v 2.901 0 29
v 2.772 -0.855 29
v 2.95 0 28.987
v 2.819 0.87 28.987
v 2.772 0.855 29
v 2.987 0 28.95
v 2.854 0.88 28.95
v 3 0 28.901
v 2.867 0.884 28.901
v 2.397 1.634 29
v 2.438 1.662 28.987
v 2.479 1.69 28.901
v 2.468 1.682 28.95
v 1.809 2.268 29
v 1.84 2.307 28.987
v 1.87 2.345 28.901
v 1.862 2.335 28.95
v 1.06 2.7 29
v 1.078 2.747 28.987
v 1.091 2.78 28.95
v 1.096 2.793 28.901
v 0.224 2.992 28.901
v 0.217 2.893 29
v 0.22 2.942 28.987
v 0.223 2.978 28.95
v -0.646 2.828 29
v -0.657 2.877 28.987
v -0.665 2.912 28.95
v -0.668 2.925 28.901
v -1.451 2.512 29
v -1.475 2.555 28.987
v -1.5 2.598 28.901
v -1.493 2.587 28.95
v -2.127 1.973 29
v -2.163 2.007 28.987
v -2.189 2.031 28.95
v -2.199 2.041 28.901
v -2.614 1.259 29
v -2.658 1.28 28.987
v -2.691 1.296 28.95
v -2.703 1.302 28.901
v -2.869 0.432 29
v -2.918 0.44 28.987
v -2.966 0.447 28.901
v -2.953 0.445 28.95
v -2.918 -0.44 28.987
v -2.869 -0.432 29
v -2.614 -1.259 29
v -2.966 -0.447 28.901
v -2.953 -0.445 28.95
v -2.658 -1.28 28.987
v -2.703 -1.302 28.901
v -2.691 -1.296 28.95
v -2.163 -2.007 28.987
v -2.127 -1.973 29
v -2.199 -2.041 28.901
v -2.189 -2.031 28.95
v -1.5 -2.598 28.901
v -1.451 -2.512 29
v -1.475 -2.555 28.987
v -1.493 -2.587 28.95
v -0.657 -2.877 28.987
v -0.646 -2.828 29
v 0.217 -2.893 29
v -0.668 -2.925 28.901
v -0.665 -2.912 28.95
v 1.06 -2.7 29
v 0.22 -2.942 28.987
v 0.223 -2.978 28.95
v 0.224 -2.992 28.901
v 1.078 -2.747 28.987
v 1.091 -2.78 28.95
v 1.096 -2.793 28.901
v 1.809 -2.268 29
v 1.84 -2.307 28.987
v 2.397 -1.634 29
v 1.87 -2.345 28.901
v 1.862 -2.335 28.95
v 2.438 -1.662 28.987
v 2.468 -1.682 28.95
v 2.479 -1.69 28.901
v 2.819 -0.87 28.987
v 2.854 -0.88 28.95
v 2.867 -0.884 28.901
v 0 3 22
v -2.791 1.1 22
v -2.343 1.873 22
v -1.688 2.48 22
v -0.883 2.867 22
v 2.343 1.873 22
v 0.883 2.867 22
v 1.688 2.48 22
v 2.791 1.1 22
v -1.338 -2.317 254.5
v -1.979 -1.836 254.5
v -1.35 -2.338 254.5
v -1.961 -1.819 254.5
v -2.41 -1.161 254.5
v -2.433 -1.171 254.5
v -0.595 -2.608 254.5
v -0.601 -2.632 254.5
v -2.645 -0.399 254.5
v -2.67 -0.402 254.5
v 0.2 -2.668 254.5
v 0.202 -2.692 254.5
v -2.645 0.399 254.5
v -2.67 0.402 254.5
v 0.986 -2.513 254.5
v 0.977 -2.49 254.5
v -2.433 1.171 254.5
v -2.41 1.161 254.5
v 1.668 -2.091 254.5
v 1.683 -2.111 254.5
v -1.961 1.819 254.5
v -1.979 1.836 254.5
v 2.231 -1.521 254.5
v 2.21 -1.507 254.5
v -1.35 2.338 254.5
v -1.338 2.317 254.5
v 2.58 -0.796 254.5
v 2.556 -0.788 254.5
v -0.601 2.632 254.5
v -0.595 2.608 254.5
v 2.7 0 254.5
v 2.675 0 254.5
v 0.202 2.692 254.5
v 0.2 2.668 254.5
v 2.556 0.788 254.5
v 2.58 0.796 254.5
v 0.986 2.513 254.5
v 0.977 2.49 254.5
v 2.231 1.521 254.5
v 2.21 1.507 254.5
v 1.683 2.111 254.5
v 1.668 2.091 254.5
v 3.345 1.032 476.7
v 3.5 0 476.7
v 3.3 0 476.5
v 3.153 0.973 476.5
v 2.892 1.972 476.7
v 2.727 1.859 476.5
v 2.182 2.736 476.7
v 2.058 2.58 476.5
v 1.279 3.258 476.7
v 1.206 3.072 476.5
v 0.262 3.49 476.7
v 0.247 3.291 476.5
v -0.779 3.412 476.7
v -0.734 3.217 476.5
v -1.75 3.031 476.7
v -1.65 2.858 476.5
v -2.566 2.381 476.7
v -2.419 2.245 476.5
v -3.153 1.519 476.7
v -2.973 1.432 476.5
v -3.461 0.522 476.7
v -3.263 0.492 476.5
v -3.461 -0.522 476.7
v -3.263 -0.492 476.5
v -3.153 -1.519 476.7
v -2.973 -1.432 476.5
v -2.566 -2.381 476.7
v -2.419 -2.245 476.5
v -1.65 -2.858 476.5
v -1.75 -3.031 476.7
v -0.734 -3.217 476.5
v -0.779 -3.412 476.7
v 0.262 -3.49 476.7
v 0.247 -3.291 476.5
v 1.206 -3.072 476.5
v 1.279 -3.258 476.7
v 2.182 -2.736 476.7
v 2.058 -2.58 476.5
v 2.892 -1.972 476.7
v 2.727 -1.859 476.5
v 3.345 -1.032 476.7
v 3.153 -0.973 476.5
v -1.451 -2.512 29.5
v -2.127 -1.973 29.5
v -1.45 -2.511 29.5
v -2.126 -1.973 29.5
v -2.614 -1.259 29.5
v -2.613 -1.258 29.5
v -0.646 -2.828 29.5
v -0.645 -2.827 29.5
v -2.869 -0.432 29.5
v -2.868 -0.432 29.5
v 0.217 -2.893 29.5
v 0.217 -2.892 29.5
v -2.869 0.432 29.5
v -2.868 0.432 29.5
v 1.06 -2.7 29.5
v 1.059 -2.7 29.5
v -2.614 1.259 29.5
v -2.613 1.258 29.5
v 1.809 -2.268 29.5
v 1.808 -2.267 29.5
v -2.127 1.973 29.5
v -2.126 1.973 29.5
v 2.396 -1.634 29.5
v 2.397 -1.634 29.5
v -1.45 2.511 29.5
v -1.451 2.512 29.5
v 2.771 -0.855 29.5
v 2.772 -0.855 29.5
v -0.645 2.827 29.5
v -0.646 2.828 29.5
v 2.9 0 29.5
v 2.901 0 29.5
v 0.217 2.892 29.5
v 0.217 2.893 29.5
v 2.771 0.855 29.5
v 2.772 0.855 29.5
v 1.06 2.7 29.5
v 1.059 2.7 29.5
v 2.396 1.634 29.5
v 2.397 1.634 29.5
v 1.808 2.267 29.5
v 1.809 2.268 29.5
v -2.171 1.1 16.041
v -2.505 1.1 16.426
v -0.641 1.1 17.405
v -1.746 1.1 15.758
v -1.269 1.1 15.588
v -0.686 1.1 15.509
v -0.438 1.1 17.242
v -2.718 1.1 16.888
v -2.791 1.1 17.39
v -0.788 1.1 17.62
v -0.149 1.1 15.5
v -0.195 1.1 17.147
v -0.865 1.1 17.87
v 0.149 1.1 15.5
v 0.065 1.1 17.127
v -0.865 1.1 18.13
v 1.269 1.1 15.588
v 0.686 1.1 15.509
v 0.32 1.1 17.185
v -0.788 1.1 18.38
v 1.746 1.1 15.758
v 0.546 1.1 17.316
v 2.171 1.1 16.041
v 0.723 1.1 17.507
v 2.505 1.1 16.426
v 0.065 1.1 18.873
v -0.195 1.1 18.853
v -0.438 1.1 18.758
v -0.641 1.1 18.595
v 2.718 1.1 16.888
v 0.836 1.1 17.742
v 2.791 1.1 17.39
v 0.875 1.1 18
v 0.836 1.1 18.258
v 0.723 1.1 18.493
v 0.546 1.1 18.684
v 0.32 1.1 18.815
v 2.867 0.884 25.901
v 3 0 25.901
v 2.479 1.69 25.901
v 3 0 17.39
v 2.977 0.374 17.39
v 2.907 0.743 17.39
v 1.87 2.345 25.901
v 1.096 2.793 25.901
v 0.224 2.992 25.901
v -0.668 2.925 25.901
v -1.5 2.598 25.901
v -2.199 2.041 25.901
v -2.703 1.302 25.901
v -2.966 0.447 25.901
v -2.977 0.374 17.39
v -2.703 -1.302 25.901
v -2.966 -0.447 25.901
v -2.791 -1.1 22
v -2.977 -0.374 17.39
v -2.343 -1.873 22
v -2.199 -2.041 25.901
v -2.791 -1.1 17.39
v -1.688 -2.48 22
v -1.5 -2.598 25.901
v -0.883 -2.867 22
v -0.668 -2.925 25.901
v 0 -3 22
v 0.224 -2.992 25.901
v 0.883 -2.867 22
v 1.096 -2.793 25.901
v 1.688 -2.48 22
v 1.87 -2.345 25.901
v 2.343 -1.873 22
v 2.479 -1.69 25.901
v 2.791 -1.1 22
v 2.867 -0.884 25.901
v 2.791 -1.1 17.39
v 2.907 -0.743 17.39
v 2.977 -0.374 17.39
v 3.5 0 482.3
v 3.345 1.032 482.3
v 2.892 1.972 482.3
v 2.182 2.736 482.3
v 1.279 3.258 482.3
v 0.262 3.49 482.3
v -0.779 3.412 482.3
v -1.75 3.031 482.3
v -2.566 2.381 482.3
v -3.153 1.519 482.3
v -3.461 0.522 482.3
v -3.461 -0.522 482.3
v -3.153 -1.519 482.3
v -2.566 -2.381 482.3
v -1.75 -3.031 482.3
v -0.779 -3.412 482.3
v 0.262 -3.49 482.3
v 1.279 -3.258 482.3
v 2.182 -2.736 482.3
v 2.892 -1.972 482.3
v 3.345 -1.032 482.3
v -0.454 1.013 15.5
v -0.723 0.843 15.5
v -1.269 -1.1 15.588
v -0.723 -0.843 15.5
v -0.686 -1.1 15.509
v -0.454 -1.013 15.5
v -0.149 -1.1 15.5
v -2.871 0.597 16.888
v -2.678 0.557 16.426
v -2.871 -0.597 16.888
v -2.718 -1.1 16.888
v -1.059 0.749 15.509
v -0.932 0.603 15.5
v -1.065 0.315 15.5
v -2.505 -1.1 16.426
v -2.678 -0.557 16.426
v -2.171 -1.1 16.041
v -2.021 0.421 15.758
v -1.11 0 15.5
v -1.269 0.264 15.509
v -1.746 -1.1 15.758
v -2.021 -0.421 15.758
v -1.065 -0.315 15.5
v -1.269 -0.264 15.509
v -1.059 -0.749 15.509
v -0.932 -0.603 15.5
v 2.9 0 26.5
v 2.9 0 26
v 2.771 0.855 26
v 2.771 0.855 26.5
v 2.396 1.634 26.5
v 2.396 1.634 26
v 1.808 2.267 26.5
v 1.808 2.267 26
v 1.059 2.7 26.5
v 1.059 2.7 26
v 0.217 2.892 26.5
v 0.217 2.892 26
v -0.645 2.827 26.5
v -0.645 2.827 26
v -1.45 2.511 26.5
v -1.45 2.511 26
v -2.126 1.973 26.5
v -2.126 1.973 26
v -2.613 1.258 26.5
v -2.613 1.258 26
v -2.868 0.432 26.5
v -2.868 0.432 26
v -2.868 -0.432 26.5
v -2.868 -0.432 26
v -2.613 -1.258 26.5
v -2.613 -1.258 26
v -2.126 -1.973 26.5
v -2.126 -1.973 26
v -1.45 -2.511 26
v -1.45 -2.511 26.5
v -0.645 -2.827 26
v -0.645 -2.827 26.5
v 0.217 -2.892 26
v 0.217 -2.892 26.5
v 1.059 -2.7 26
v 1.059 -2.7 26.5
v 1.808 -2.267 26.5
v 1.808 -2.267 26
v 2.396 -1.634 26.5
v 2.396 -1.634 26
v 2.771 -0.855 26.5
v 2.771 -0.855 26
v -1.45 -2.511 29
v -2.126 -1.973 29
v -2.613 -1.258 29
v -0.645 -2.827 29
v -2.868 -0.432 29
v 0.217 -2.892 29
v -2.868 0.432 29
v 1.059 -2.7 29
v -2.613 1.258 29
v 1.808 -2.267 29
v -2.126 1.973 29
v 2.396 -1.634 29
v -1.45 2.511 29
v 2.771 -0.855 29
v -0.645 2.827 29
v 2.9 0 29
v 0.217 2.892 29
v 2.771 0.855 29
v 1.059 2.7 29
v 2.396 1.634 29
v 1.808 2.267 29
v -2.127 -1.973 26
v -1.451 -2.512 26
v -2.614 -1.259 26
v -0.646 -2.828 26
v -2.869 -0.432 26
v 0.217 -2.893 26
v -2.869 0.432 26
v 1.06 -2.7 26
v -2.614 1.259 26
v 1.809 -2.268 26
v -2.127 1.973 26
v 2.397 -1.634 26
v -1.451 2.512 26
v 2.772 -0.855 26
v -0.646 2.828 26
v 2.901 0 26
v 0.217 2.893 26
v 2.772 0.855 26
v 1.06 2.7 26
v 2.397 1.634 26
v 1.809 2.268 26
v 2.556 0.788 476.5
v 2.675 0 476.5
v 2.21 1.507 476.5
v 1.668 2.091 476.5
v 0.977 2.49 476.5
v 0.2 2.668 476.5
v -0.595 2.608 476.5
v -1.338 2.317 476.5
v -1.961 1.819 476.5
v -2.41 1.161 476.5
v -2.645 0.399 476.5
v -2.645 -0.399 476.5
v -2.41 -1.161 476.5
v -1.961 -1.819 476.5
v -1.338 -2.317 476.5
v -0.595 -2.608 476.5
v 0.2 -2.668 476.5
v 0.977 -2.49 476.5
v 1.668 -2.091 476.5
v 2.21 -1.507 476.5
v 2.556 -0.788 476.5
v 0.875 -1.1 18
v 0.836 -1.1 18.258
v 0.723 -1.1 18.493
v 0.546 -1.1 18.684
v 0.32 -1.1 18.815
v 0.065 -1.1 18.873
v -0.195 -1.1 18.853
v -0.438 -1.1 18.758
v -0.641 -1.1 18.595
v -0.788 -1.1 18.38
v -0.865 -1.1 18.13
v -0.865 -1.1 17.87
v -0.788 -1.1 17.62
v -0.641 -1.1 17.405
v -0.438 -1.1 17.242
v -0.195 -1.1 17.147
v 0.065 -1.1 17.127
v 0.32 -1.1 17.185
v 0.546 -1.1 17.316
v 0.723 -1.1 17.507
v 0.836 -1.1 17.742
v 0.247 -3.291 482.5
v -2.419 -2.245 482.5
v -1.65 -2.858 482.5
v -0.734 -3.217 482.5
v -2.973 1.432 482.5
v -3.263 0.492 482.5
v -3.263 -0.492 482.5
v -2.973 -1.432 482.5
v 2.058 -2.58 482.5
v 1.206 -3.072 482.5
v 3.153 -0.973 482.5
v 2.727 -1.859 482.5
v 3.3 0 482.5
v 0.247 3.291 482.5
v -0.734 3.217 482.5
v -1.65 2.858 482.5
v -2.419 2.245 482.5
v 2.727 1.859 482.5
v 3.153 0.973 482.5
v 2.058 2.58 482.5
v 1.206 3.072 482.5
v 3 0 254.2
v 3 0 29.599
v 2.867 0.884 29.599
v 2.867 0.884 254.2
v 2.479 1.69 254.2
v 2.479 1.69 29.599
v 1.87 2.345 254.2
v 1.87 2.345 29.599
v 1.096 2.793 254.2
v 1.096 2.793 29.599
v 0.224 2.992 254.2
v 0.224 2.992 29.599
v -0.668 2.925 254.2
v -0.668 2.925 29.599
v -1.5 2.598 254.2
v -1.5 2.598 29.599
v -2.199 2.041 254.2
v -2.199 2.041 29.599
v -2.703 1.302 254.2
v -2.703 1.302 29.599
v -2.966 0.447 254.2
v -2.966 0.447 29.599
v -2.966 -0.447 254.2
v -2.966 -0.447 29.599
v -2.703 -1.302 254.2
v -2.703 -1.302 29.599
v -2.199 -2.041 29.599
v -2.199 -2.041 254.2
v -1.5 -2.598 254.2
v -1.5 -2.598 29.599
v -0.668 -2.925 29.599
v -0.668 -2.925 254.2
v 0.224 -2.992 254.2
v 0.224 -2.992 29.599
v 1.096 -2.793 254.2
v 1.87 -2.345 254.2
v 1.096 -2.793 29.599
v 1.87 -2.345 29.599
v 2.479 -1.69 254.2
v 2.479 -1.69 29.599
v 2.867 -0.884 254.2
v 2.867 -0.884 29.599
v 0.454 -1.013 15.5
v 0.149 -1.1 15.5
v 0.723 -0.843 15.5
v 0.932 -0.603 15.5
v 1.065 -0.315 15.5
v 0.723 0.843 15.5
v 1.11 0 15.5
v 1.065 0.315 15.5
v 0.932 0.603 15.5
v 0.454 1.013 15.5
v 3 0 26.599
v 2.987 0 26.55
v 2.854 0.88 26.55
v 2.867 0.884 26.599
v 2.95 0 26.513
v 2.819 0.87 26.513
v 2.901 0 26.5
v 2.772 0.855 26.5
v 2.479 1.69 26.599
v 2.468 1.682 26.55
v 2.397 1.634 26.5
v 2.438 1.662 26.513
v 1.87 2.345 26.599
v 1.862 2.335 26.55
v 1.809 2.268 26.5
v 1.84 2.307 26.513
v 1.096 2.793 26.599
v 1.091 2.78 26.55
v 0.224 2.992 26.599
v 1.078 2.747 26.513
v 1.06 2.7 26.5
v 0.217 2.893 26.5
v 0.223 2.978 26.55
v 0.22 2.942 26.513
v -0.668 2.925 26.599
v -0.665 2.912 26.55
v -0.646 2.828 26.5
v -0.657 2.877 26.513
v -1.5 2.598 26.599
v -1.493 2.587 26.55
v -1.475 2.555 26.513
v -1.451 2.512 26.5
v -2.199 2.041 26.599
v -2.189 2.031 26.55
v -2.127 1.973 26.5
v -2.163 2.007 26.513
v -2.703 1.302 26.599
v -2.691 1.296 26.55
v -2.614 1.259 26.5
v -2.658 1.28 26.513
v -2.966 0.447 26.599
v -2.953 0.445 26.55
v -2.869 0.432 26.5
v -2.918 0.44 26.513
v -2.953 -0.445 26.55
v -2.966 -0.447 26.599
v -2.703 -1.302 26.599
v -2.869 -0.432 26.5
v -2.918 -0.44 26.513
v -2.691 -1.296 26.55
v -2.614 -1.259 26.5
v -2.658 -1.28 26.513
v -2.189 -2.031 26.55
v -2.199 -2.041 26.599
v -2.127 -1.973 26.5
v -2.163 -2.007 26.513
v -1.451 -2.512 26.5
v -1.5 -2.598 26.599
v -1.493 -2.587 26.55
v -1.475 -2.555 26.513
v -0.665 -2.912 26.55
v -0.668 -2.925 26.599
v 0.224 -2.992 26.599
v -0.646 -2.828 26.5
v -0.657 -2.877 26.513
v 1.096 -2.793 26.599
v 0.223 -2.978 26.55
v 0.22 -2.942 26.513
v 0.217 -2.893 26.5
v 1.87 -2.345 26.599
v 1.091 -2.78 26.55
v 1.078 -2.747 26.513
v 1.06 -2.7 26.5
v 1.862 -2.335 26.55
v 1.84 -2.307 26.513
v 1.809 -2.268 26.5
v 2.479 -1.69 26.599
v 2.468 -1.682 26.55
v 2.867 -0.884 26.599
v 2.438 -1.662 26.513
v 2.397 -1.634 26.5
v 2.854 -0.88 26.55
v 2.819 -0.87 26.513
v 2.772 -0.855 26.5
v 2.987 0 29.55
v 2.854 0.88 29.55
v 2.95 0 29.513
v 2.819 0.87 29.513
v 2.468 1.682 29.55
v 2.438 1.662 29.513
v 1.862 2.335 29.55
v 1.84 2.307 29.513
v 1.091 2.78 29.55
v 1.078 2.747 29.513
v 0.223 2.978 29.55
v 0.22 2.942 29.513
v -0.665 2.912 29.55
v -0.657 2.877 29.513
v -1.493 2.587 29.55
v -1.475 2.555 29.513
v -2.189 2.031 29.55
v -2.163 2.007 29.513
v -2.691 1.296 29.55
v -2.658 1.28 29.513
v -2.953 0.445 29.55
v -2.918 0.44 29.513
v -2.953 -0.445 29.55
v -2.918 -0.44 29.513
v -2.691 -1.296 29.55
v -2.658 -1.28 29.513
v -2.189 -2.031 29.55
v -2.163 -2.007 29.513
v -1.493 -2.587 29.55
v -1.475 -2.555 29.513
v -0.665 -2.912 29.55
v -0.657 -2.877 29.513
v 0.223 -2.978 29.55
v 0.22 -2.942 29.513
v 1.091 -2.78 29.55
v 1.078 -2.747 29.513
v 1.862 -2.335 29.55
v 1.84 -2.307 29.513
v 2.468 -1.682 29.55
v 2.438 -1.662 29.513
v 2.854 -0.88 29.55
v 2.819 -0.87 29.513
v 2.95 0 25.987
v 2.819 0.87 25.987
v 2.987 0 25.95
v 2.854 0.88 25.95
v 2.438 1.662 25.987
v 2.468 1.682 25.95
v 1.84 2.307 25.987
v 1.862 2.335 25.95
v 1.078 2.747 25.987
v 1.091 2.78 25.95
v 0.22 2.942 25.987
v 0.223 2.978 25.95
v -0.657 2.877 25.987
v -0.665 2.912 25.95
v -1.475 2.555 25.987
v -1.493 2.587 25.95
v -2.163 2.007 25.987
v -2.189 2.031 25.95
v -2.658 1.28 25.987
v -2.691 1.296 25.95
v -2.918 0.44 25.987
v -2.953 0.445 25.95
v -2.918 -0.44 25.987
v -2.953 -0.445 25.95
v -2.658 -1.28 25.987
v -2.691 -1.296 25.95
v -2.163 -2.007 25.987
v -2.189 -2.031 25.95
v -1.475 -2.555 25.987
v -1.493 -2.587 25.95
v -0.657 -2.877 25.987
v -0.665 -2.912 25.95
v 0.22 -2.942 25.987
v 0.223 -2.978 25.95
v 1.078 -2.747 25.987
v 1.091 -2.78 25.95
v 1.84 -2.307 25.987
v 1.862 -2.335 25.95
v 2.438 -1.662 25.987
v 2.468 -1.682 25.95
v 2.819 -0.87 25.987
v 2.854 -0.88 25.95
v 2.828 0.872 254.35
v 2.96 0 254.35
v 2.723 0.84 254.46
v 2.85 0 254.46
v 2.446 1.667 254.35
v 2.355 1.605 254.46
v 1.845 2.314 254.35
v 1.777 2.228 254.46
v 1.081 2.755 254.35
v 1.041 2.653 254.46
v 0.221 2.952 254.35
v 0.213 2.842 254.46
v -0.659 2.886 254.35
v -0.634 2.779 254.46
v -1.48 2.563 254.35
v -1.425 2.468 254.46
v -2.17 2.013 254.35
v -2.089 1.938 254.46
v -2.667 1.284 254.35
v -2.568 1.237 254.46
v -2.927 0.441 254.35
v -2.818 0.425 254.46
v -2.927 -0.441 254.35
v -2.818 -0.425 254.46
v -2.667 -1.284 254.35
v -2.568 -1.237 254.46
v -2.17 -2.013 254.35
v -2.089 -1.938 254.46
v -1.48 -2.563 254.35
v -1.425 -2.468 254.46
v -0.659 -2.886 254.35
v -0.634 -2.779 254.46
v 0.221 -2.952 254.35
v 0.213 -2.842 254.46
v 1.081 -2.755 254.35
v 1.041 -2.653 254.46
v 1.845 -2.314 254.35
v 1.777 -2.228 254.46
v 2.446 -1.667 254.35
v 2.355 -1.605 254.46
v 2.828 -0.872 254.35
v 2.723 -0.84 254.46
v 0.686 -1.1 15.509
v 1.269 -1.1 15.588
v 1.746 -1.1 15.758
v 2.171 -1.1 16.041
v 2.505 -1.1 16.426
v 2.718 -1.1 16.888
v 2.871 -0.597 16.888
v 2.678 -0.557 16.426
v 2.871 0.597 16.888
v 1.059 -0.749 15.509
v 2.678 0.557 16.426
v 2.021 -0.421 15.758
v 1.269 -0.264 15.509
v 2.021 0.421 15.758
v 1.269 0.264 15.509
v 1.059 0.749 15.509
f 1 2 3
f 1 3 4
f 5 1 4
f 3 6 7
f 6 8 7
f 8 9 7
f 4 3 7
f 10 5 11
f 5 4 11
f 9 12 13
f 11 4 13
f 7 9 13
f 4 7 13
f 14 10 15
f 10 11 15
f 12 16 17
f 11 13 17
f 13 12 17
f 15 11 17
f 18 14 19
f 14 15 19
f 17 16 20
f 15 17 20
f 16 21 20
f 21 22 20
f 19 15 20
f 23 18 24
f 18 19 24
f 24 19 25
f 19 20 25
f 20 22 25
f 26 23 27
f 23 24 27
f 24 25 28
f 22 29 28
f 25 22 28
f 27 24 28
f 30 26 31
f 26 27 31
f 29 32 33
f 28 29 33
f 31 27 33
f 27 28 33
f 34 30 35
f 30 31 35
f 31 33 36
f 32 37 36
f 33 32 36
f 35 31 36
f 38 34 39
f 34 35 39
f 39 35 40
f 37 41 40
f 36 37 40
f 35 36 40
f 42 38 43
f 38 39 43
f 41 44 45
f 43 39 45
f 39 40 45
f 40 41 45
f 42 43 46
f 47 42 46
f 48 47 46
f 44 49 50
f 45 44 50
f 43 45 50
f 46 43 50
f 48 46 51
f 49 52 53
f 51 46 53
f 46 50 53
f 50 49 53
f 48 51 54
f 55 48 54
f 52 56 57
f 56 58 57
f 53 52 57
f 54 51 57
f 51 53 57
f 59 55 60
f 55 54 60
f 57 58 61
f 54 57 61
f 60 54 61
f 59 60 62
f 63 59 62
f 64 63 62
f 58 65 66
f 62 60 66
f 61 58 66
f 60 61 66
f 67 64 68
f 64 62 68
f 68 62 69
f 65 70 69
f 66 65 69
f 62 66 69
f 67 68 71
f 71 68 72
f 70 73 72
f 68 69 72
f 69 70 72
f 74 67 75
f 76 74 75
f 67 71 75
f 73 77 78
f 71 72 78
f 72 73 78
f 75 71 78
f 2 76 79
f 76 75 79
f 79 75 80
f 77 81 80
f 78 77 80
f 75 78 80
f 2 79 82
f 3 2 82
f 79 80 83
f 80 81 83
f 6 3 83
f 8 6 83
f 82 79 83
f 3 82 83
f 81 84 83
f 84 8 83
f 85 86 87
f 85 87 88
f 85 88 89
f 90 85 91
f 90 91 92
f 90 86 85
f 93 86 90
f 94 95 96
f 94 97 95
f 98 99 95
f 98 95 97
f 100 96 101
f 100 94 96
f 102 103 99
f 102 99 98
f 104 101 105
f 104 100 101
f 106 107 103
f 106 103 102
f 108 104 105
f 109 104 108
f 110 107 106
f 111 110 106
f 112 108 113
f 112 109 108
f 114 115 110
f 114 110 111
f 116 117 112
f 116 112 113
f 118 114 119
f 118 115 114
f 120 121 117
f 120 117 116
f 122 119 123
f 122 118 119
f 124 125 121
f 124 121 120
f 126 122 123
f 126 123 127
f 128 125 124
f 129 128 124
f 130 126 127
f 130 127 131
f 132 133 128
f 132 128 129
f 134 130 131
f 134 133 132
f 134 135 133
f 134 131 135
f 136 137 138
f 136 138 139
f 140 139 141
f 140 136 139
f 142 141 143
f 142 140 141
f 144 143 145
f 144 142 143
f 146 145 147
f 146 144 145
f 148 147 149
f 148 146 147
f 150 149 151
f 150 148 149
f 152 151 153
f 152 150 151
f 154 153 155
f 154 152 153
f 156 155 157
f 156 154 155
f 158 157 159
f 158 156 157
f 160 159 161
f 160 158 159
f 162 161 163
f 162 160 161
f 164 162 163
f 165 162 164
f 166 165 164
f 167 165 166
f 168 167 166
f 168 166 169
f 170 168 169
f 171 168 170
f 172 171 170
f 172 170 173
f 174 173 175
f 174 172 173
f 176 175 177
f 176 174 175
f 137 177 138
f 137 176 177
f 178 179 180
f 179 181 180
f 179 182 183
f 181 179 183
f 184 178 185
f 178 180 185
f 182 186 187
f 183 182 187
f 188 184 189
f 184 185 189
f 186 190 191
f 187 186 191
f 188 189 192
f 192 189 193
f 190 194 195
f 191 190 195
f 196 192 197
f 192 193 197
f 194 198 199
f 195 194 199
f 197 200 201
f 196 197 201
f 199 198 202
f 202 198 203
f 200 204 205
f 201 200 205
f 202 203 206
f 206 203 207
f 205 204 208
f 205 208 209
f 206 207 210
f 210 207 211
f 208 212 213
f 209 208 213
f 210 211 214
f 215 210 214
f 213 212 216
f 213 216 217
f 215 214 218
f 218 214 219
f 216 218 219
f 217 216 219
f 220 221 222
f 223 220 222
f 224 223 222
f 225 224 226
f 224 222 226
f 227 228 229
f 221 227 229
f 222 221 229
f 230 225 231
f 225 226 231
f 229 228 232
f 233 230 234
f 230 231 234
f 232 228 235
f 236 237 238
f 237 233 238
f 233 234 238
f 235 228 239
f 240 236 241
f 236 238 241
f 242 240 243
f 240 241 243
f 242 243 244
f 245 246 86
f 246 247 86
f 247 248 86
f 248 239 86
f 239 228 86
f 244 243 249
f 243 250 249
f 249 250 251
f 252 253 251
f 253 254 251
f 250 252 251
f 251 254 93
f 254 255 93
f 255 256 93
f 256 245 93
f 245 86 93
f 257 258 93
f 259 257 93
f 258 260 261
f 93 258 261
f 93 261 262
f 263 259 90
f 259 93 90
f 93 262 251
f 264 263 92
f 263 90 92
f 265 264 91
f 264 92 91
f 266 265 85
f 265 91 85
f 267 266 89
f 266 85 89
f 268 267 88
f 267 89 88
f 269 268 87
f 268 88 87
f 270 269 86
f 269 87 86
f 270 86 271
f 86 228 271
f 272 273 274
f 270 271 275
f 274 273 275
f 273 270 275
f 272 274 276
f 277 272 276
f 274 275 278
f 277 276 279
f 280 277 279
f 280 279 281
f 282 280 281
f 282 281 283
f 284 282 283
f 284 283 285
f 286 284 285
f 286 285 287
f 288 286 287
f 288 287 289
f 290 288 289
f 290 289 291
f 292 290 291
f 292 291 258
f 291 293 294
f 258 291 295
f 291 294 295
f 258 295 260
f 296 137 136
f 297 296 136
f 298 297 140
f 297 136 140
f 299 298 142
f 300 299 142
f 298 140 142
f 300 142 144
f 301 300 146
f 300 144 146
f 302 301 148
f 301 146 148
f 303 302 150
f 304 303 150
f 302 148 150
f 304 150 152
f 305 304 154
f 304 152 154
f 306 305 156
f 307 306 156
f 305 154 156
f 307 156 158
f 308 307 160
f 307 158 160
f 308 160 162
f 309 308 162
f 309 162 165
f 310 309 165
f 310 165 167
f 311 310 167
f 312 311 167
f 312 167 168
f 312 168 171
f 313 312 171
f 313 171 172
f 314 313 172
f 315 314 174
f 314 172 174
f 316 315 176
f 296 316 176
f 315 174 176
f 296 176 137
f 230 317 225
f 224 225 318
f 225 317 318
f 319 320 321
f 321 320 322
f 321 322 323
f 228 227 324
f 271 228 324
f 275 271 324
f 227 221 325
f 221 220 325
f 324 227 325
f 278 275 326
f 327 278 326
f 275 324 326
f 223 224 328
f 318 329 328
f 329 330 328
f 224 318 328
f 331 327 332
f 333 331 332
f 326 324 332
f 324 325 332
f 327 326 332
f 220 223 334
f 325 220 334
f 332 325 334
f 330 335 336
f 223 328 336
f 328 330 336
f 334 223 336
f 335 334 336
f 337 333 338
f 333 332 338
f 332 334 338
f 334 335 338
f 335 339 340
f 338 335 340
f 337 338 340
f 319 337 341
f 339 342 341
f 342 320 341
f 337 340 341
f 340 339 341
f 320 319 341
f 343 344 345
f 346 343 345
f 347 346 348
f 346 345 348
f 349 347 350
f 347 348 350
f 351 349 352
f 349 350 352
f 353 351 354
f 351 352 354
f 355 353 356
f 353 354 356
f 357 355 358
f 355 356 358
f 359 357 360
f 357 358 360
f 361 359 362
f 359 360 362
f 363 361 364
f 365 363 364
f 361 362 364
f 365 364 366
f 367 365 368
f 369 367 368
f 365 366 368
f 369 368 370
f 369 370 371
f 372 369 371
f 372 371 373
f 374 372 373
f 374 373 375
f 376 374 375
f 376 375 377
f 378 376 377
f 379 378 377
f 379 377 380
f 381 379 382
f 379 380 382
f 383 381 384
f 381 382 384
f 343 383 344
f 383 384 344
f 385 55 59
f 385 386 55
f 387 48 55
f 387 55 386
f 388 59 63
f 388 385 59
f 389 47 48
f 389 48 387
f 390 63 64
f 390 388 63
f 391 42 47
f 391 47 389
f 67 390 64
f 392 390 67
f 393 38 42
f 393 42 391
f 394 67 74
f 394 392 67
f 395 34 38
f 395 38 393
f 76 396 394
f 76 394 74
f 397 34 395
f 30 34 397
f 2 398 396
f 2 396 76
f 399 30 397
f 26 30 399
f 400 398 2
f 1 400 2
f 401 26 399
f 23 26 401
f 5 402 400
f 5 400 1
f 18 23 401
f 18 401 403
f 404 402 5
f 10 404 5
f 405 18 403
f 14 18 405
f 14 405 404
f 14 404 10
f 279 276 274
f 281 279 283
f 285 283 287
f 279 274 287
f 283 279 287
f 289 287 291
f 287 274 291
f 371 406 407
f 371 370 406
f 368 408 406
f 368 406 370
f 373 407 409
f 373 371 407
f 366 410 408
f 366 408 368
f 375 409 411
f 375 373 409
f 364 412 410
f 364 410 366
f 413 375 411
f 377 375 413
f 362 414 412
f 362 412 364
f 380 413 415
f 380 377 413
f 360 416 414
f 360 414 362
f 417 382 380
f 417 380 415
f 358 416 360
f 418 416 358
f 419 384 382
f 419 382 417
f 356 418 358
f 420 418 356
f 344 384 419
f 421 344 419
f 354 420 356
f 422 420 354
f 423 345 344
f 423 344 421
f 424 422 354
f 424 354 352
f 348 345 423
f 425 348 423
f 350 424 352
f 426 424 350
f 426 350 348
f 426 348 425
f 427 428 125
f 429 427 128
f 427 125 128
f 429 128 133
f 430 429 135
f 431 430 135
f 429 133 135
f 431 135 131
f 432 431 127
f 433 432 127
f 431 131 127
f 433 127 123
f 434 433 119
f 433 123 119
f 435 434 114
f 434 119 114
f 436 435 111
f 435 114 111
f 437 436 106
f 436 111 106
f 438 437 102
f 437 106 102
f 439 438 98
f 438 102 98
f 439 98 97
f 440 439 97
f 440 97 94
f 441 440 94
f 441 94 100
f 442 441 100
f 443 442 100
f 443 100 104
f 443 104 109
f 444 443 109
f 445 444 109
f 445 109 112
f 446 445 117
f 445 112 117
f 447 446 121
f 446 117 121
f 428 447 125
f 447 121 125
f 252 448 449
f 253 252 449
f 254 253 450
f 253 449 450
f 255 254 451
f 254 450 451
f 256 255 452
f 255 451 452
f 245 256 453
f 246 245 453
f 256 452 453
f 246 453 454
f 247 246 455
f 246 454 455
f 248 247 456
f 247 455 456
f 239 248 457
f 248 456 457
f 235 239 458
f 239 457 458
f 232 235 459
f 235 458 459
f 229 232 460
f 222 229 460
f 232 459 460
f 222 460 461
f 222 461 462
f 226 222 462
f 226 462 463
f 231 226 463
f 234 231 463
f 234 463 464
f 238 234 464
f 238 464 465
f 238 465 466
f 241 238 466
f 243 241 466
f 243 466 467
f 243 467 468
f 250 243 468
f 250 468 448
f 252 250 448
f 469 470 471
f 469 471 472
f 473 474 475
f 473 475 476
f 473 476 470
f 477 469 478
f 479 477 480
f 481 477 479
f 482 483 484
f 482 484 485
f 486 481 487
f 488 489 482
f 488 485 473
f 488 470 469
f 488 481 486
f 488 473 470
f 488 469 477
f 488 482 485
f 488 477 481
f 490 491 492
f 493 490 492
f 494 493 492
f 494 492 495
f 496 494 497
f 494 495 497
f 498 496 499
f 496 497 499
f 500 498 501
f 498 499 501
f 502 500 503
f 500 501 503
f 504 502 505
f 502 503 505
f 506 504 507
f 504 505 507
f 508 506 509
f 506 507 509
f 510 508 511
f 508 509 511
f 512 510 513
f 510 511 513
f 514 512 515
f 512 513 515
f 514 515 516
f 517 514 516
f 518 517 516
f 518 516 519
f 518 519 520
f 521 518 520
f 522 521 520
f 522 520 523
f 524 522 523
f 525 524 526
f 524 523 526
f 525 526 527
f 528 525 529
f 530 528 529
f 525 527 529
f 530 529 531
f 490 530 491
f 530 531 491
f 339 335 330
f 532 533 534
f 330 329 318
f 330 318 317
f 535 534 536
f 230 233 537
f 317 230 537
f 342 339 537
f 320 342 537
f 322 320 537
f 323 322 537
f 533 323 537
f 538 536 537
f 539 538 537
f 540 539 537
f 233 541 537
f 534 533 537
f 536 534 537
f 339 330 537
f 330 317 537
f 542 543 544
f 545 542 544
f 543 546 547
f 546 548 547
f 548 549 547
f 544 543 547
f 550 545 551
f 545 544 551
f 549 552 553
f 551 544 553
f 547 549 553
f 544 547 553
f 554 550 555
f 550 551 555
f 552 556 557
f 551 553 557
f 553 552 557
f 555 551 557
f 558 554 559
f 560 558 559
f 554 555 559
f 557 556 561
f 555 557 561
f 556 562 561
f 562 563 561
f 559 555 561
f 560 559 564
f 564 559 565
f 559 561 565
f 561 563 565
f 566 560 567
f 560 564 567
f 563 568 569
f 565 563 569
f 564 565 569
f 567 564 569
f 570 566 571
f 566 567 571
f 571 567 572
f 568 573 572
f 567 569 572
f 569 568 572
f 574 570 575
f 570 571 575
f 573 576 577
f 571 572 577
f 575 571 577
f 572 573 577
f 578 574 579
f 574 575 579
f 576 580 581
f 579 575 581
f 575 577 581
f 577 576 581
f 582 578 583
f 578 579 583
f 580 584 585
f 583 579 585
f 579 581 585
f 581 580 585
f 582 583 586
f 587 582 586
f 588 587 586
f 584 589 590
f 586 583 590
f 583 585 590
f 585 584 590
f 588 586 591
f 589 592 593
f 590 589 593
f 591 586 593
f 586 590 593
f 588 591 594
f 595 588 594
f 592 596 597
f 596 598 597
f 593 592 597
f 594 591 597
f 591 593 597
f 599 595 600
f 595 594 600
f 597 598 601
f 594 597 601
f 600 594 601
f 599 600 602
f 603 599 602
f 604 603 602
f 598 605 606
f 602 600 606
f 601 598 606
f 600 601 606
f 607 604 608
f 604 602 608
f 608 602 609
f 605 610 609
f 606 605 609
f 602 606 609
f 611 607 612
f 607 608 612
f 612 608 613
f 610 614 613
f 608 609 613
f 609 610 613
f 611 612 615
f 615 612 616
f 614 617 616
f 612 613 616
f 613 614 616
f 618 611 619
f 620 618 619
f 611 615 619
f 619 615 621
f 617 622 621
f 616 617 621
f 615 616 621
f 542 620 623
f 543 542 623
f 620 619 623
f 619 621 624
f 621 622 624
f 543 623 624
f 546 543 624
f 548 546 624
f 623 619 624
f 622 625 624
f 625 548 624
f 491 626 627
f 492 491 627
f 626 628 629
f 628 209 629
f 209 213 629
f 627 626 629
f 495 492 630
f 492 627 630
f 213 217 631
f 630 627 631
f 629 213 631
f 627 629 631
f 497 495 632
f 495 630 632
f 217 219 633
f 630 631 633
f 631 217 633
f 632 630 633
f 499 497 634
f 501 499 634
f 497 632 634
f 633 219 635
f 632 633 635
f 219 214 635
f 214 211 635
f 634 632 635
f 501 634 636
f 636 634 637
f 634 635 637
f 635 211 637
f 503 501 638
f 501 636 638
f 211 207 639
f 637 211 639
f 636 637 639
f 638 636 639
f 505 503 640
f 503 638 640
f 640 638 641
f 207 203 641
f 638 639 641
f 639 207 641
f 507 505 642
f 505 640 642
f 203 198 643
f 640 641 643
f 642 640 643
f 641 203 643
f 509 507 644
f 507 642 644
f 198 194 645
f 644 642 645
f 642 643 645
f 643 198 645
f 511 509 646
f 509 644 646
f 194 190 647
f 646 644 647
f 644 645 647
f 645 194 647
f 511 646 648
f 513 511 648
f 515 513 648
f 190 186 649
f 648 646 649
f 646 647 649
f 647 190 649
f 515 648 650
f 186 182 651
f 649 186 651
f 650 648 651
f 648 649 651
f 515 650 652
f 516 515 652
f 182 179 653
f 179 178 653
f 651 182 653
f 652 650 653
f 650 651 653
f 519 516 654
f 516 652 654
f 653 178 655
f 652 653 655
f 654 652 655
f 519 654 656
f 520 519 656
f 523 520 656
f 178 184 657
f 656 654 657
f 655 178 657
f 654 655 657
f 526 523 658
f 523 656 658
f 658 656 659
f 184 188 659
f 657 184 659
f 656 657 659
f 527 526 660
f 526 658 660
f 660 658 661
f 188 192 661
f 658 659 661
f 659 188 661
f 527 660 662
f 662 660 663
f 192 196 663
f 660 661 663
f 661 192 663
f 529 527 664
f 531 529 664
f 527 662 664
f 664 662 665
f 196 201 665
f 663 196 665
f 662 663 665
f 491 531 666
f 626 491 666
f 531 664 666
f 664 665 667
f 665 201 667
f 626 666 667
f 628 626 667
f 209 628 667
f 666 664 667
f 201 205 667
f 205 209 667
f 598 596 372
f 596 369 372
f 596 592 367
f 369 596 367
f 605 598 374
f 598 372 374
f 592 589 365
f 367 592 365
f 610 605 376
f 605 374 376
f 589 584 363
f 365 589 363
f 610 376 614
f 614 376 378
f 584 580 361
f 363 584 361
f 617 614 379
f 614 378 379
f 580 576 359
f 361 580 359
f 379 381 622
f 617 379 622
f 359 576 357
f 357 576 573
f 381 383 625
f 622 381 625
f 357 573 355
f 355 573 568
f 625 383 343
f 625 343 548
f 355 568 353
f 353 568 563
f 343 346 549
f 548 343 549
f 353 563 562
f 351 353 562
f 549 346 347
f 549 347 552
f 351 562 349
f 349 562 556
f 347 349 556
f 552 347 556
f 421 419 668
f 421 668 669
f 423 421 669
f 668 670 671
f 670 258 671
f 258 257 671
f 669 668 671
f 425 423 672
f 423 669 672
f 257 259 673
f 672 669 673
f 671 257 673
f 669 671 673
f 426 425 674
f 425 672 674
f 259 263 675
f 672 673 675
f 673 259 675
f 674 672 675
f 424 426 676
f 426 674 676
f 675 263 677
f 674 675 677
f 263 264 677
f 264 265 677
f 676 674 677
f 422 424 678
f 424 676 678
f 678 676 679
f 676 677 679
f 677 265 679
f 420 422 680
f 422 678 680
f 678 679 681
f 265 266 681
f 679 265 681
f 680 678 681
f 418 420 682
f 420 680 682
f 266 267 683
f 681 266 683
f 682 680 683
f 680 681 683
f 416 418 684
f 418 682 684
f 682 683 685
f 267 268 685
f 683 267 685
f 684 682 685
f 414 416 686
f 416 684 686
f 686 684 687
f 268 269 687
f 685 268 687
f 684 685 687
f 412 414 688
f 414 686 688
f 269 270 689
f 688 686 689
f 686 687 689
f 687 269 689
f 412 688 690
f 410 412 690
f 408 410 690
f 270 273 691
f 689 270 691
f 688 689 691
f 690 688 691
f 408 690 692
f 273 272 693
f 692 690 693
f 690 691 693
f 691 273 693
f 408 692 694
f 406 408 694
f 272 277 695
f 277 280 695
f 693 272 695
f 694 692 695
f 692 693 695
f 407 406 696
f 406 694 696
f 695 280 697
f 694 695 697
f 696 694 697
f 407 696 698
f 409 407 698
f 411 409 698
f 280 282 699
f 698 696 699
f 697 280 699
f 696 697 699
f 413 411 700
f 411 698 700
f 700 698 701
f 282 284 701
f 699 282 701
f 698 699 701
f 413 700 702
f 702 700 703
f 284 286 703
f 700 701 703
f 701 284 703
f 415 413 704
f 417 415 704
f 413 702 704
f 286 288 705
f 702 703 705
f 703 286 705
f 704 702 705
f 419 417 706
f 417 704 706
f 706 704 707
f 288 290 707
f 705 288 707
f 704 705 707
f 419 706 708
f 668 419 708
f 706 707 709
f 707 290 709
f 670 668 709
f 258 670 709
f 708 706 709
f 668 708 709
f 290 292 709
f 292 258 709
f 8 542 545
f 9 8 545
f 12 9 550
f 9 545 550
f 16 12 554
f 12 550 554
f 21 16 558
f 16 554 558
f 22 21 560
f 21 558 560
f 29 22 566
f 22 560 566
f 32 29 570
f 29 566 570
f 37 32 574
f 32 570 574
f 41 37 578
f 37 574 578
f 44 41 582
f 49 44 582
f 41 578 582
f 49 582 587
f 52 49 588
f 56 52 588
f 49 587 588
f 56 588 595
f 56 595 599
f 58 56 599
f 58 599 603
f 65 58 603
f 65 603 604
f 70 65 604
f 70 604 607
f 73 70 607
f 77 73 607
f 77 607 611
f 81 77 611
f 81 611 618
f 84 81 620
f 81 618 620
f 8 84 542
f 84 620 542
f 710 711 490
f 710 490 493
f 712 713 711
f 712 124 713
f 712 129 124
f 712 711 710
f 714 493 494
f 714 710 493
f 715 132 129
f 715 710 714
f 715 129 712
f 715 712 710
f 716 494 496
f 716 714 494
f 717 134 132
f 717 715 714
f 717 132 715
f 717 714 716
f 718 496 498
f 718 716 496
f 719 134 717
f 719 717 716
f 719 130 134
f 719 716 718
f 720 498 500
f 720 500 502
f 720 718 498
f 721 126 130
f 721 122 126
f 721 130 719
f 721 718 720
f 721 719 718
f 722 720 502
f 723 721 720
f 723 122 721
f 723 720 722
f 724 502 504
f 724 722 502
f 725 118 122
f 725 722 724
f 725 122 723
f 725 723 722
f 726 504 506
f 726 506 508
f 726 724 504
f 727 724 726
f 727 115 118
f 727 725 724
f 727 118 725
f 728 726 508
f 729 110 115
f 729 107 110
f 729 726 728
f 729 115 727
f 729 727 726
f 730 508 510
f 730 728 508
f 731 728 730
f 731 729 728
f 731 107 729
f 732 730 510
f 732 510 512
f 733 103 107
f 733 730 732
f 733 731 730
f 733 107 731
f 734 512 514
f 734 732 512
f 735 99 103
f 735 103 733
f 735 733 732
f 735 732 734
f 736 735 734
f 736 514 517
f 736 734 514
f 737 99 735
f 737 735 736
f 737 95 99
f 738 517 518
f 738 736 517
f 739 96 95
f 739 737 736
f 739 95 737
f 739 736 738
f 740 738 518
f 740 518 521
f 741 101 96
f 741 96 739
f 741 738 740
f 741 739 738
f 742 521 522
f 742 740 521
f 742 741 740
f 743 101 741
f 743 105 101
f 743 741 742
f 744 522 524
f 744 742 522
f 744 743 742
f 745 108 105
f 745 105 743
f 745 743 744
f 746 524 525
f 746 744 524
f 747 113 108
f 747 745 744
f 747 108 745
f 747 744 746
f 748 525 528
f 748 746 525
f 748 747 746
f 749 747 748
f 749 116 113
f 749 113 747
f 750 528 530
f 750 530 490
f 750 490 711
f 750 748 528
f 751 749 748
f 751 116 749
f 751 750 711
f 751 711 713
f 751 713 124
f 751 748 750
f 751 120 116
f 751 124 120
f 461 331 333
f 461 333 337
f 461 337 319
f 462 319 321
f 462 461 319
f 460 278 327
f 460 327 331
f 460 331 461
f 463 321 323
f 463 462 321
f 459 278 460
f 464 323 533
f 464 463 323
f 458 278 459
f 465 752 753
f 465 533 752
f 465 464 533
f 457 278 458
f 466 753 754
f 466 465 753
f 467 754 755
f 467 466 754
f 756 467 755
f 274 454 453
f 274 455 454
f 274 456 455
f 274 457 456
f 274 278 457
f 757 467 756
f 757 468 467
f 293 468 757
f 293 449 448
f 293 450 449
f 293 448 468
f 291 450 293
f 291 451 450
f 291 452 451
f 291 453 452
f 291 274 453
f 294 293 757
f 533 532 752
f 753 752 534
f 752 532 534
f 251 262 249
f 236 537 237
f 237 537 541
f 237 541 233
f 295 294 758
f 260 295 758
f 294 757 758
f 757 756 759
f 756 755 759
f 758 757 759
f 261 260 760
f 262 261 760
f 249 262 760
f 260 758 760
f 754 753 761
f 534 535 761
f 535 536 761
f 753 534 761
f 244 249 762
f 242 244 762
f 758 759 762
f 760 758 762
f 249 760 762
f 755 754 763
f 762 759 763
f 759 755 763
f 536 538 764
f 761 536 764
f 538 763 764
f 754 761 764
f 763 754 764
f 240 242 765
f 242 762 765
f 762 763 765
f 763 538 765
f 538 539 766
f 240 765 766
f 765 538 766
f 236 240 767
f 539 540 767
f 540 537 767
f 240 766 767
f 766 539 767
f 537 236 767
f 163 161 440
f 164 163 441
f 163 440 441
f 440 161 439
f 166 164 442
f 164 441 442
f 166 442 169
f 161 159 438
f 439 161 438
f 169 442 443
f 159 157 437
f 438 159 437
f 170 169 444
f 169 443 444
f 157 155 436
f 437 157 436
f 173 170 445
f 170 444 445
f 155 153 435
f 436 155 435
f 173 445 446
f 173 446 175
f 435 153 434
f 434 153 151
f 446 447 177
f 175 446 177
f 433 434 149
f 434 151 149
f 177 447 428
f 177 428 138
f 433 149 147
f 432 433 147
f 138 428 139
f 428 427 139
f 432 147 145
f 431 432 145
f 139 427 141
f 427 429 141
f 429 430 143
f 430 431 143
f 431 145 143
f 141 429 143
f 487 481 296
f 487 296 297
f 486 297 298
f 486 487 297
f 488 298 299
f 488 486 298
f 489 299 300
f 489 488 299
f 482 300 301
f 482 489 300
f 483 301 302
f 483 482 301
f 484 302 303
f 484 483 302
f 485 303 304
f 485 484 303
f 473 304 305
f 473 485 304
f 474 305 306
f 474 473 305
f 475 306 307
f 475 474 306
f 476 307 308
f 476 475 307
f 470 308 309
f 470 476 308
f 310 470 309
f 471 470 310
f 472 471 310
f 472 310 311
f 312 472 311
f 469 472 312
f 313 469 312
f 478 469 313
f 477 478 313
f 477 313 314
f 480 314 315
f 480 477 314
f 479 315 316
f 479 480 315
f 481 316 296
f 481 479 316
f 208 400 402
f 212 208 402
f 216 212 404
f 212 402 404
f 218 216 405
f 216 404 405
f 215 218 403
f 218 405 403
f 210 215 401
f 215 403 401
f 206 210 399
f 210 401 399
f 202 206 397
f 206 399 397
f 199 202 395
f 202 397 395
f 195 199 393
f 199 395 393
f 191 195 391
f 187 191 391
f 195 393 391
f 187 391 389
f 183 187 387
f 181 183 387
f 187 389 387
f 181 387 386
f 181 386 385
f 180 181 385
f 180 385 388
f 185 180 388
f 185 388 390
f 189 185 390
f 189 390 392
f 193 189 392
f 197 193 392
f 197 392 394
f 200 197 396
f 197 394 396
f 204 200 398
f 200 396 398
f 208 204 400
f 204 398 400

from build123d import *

# Parameters (mm, degrees)
SKETCH010_R     = 3
PAD006_DEPTH    = 10.5
SKETCH011_R     = 2.9
PAD007_DEPTH    = 0.5
SKETCH012_R     = 3
PAD008_DEPTH    = 2.5
SKETCH013_R     = 2.9
PAD009_DEPTH    = 0.5
SKETCH014_R     = 3
PAD010_DEPTH    = 225
SKETCH015_R     = 2.675
PAD011_DEPTH    = 222
SKETCH016_R     = 3.5
PAD012_DEPTH    = 6
SKETCH017_W     = 10
SKETCH017_H     = 8
POCKET003_DEPTH = 5
SKETCH018_W     = 10
SKETCH018_H     = 8
POCKET004_DEPTH = 5
SKETCH019_R     = 0.875
HOLE001_DEPTH   = 2.474247
HOLE001_TIPS_R  = 0.875
FILLET003_R     = 0.099
FILLET004_R     = 0.3
CHAMFER_SIZE    = 0.2
FILLET005_R     = 1.89


with BuildPart() as part:
    # Sketch010 → Pad006 (new body)
    with BuildSketch(Plane.XY):
        Circle(SKETCH010_R)
    extrude(amount=PAD006_DEPTH)

    # Sketch011 (on Face3 of Pad006) → Pad007 (join)
    with BuildSketch(Plane.XY.offset(10.5)):
        Circle(SKETCH011_R)
    extrude(amount=PAD007_DEPTH)

    # Sketch012 (on Face5 of Pad007) → Pad008 (join)
    with BuildSketch(Plane.XY.offset(11)):
        Circle(SKETCH012_R)
    extrude(amount=PAD008_DEPTH)

    # Sketch013 (on Face3 of Pad008) → Pad009 (join)
    with BuildSketch(Plane.XY.offset(13.5)):
        Circle(SKETCH013_R)
    extrude(amount=PAD009_DEPTH)

    # Sketch014 (on Face7 of Pad009) → Pad010 (join)
    with BuildSketch(Plane.XY.offset(14)):
        Circle(SKETCH014_R)
    extrude(amount=PAD010_DEPTH)

    # Sketch015 (on Face3 of Pad010) → Pad011 (join)
    with BuildSketch(Plane.XY.offset(239)):
        Circle(SKETCH015_R)
    extrude(amount=PAD011_DEPTH)

    # Sketch016 (on Face7 of Pad011) → Pad012 (join)
    with BuildSketch(Plane.XY.offset(461)):
        Circle(SKETCH016_R)
    extrude(amount=PAD012_DEPTH)

    # Sketch017 (on DatumPlane) → Pocket003 (cut)
    with BuildSketch(Plane(origin=(0, 1.1, 5.25), x_dir=(1, 0, 0), z_dir=(0, -1, 0))):
        with Locations((0, -2.75)):
            Rectangle(SKETCH017_W, SKETCH017_H)
    extrude(amount=-POCKET003_DEPTH, mode=Mode.SUBTRACT)

    # Sketch018 (on DatumPlane) → Pocket004 (cut)
    with BuildSketch(Plane(origin=(0, -1.1, 5.25), x_dir=(1, 0, 0), z_dir=(0, -1, 0))):
        with Locations((0, -2.75)):
            Rectangle(SKETCH018_W, SKETCH018_H)
    extrude(amount=POCKET004_DEPTH, mode=Mode.SUBTRACT)

    # Sketch019 (on Face18 of Pocket004) → Hole001 (cut)
    with BuildSketch(Plane.XZ.offset(1.1)):
        with Locations((0, 2.5)):
            Circle(SKETCH019_R)
    extrude(amount=-HOLE001_DEPTH, mode=Mode.SUBTRACT)

    # Hole001 tips → Hole001 tip 1 section 0
    with BuildSketch(Plane.XZ.offset(-1.374247), mode=Mode.PRIVATE) as hole001_tip_1_s0:
        with Locations((0, 2.5)):
            Circle(HOLE001_TIPS_R)
    loft([hole001_tip_1_s0.sketch, Vertex(0, 1.9, 2.5)], mode=Mode.SUBTRACT)

    # Fillet003
    fillet003_edges = [part.edges().sort_by_distance(p)[0] for p in [
        (-3, 0, 11),
        (-3, 0, 14),
        (-3, 0, 13.5),
        (-3, 0, 10.5),
    ]]
    fillet(fillet003_edges, radius=FILLET003_R)

    # Fillet004
    fillet004_edges = [part.edges().sort_by_distance(p)[0] for p in [
        (-3, 0, 239),
    ]]
    fillet(fillet004_edges, radius=FILLET004_R)

    # Chamfer
    chamfer_edges = [part.edges().sort_by_distance(p)[0] for p in [
        (-3.5, 0, 467),
        (-3.5, 0, 461),
    ]]
    chamfer(chamfer_edges, length=CHAMFER_SIZE)

    # Fillet005
    fillet005_edges = [part.edges().sort_by_distance(p)[0] for p in [
        (-3, 0, 0),
        (2.947301, -0.559834, 0),
        (2.947301, 0.559834, 0),
    ]]
    fillet(fillet005_edges, radius=FILLET005_R)


with BuildPart() as part_1:
    # Body003 placement: moved
    add(part.part.moved(Location((0, 0, 15.5))))


solid = part_1.part
